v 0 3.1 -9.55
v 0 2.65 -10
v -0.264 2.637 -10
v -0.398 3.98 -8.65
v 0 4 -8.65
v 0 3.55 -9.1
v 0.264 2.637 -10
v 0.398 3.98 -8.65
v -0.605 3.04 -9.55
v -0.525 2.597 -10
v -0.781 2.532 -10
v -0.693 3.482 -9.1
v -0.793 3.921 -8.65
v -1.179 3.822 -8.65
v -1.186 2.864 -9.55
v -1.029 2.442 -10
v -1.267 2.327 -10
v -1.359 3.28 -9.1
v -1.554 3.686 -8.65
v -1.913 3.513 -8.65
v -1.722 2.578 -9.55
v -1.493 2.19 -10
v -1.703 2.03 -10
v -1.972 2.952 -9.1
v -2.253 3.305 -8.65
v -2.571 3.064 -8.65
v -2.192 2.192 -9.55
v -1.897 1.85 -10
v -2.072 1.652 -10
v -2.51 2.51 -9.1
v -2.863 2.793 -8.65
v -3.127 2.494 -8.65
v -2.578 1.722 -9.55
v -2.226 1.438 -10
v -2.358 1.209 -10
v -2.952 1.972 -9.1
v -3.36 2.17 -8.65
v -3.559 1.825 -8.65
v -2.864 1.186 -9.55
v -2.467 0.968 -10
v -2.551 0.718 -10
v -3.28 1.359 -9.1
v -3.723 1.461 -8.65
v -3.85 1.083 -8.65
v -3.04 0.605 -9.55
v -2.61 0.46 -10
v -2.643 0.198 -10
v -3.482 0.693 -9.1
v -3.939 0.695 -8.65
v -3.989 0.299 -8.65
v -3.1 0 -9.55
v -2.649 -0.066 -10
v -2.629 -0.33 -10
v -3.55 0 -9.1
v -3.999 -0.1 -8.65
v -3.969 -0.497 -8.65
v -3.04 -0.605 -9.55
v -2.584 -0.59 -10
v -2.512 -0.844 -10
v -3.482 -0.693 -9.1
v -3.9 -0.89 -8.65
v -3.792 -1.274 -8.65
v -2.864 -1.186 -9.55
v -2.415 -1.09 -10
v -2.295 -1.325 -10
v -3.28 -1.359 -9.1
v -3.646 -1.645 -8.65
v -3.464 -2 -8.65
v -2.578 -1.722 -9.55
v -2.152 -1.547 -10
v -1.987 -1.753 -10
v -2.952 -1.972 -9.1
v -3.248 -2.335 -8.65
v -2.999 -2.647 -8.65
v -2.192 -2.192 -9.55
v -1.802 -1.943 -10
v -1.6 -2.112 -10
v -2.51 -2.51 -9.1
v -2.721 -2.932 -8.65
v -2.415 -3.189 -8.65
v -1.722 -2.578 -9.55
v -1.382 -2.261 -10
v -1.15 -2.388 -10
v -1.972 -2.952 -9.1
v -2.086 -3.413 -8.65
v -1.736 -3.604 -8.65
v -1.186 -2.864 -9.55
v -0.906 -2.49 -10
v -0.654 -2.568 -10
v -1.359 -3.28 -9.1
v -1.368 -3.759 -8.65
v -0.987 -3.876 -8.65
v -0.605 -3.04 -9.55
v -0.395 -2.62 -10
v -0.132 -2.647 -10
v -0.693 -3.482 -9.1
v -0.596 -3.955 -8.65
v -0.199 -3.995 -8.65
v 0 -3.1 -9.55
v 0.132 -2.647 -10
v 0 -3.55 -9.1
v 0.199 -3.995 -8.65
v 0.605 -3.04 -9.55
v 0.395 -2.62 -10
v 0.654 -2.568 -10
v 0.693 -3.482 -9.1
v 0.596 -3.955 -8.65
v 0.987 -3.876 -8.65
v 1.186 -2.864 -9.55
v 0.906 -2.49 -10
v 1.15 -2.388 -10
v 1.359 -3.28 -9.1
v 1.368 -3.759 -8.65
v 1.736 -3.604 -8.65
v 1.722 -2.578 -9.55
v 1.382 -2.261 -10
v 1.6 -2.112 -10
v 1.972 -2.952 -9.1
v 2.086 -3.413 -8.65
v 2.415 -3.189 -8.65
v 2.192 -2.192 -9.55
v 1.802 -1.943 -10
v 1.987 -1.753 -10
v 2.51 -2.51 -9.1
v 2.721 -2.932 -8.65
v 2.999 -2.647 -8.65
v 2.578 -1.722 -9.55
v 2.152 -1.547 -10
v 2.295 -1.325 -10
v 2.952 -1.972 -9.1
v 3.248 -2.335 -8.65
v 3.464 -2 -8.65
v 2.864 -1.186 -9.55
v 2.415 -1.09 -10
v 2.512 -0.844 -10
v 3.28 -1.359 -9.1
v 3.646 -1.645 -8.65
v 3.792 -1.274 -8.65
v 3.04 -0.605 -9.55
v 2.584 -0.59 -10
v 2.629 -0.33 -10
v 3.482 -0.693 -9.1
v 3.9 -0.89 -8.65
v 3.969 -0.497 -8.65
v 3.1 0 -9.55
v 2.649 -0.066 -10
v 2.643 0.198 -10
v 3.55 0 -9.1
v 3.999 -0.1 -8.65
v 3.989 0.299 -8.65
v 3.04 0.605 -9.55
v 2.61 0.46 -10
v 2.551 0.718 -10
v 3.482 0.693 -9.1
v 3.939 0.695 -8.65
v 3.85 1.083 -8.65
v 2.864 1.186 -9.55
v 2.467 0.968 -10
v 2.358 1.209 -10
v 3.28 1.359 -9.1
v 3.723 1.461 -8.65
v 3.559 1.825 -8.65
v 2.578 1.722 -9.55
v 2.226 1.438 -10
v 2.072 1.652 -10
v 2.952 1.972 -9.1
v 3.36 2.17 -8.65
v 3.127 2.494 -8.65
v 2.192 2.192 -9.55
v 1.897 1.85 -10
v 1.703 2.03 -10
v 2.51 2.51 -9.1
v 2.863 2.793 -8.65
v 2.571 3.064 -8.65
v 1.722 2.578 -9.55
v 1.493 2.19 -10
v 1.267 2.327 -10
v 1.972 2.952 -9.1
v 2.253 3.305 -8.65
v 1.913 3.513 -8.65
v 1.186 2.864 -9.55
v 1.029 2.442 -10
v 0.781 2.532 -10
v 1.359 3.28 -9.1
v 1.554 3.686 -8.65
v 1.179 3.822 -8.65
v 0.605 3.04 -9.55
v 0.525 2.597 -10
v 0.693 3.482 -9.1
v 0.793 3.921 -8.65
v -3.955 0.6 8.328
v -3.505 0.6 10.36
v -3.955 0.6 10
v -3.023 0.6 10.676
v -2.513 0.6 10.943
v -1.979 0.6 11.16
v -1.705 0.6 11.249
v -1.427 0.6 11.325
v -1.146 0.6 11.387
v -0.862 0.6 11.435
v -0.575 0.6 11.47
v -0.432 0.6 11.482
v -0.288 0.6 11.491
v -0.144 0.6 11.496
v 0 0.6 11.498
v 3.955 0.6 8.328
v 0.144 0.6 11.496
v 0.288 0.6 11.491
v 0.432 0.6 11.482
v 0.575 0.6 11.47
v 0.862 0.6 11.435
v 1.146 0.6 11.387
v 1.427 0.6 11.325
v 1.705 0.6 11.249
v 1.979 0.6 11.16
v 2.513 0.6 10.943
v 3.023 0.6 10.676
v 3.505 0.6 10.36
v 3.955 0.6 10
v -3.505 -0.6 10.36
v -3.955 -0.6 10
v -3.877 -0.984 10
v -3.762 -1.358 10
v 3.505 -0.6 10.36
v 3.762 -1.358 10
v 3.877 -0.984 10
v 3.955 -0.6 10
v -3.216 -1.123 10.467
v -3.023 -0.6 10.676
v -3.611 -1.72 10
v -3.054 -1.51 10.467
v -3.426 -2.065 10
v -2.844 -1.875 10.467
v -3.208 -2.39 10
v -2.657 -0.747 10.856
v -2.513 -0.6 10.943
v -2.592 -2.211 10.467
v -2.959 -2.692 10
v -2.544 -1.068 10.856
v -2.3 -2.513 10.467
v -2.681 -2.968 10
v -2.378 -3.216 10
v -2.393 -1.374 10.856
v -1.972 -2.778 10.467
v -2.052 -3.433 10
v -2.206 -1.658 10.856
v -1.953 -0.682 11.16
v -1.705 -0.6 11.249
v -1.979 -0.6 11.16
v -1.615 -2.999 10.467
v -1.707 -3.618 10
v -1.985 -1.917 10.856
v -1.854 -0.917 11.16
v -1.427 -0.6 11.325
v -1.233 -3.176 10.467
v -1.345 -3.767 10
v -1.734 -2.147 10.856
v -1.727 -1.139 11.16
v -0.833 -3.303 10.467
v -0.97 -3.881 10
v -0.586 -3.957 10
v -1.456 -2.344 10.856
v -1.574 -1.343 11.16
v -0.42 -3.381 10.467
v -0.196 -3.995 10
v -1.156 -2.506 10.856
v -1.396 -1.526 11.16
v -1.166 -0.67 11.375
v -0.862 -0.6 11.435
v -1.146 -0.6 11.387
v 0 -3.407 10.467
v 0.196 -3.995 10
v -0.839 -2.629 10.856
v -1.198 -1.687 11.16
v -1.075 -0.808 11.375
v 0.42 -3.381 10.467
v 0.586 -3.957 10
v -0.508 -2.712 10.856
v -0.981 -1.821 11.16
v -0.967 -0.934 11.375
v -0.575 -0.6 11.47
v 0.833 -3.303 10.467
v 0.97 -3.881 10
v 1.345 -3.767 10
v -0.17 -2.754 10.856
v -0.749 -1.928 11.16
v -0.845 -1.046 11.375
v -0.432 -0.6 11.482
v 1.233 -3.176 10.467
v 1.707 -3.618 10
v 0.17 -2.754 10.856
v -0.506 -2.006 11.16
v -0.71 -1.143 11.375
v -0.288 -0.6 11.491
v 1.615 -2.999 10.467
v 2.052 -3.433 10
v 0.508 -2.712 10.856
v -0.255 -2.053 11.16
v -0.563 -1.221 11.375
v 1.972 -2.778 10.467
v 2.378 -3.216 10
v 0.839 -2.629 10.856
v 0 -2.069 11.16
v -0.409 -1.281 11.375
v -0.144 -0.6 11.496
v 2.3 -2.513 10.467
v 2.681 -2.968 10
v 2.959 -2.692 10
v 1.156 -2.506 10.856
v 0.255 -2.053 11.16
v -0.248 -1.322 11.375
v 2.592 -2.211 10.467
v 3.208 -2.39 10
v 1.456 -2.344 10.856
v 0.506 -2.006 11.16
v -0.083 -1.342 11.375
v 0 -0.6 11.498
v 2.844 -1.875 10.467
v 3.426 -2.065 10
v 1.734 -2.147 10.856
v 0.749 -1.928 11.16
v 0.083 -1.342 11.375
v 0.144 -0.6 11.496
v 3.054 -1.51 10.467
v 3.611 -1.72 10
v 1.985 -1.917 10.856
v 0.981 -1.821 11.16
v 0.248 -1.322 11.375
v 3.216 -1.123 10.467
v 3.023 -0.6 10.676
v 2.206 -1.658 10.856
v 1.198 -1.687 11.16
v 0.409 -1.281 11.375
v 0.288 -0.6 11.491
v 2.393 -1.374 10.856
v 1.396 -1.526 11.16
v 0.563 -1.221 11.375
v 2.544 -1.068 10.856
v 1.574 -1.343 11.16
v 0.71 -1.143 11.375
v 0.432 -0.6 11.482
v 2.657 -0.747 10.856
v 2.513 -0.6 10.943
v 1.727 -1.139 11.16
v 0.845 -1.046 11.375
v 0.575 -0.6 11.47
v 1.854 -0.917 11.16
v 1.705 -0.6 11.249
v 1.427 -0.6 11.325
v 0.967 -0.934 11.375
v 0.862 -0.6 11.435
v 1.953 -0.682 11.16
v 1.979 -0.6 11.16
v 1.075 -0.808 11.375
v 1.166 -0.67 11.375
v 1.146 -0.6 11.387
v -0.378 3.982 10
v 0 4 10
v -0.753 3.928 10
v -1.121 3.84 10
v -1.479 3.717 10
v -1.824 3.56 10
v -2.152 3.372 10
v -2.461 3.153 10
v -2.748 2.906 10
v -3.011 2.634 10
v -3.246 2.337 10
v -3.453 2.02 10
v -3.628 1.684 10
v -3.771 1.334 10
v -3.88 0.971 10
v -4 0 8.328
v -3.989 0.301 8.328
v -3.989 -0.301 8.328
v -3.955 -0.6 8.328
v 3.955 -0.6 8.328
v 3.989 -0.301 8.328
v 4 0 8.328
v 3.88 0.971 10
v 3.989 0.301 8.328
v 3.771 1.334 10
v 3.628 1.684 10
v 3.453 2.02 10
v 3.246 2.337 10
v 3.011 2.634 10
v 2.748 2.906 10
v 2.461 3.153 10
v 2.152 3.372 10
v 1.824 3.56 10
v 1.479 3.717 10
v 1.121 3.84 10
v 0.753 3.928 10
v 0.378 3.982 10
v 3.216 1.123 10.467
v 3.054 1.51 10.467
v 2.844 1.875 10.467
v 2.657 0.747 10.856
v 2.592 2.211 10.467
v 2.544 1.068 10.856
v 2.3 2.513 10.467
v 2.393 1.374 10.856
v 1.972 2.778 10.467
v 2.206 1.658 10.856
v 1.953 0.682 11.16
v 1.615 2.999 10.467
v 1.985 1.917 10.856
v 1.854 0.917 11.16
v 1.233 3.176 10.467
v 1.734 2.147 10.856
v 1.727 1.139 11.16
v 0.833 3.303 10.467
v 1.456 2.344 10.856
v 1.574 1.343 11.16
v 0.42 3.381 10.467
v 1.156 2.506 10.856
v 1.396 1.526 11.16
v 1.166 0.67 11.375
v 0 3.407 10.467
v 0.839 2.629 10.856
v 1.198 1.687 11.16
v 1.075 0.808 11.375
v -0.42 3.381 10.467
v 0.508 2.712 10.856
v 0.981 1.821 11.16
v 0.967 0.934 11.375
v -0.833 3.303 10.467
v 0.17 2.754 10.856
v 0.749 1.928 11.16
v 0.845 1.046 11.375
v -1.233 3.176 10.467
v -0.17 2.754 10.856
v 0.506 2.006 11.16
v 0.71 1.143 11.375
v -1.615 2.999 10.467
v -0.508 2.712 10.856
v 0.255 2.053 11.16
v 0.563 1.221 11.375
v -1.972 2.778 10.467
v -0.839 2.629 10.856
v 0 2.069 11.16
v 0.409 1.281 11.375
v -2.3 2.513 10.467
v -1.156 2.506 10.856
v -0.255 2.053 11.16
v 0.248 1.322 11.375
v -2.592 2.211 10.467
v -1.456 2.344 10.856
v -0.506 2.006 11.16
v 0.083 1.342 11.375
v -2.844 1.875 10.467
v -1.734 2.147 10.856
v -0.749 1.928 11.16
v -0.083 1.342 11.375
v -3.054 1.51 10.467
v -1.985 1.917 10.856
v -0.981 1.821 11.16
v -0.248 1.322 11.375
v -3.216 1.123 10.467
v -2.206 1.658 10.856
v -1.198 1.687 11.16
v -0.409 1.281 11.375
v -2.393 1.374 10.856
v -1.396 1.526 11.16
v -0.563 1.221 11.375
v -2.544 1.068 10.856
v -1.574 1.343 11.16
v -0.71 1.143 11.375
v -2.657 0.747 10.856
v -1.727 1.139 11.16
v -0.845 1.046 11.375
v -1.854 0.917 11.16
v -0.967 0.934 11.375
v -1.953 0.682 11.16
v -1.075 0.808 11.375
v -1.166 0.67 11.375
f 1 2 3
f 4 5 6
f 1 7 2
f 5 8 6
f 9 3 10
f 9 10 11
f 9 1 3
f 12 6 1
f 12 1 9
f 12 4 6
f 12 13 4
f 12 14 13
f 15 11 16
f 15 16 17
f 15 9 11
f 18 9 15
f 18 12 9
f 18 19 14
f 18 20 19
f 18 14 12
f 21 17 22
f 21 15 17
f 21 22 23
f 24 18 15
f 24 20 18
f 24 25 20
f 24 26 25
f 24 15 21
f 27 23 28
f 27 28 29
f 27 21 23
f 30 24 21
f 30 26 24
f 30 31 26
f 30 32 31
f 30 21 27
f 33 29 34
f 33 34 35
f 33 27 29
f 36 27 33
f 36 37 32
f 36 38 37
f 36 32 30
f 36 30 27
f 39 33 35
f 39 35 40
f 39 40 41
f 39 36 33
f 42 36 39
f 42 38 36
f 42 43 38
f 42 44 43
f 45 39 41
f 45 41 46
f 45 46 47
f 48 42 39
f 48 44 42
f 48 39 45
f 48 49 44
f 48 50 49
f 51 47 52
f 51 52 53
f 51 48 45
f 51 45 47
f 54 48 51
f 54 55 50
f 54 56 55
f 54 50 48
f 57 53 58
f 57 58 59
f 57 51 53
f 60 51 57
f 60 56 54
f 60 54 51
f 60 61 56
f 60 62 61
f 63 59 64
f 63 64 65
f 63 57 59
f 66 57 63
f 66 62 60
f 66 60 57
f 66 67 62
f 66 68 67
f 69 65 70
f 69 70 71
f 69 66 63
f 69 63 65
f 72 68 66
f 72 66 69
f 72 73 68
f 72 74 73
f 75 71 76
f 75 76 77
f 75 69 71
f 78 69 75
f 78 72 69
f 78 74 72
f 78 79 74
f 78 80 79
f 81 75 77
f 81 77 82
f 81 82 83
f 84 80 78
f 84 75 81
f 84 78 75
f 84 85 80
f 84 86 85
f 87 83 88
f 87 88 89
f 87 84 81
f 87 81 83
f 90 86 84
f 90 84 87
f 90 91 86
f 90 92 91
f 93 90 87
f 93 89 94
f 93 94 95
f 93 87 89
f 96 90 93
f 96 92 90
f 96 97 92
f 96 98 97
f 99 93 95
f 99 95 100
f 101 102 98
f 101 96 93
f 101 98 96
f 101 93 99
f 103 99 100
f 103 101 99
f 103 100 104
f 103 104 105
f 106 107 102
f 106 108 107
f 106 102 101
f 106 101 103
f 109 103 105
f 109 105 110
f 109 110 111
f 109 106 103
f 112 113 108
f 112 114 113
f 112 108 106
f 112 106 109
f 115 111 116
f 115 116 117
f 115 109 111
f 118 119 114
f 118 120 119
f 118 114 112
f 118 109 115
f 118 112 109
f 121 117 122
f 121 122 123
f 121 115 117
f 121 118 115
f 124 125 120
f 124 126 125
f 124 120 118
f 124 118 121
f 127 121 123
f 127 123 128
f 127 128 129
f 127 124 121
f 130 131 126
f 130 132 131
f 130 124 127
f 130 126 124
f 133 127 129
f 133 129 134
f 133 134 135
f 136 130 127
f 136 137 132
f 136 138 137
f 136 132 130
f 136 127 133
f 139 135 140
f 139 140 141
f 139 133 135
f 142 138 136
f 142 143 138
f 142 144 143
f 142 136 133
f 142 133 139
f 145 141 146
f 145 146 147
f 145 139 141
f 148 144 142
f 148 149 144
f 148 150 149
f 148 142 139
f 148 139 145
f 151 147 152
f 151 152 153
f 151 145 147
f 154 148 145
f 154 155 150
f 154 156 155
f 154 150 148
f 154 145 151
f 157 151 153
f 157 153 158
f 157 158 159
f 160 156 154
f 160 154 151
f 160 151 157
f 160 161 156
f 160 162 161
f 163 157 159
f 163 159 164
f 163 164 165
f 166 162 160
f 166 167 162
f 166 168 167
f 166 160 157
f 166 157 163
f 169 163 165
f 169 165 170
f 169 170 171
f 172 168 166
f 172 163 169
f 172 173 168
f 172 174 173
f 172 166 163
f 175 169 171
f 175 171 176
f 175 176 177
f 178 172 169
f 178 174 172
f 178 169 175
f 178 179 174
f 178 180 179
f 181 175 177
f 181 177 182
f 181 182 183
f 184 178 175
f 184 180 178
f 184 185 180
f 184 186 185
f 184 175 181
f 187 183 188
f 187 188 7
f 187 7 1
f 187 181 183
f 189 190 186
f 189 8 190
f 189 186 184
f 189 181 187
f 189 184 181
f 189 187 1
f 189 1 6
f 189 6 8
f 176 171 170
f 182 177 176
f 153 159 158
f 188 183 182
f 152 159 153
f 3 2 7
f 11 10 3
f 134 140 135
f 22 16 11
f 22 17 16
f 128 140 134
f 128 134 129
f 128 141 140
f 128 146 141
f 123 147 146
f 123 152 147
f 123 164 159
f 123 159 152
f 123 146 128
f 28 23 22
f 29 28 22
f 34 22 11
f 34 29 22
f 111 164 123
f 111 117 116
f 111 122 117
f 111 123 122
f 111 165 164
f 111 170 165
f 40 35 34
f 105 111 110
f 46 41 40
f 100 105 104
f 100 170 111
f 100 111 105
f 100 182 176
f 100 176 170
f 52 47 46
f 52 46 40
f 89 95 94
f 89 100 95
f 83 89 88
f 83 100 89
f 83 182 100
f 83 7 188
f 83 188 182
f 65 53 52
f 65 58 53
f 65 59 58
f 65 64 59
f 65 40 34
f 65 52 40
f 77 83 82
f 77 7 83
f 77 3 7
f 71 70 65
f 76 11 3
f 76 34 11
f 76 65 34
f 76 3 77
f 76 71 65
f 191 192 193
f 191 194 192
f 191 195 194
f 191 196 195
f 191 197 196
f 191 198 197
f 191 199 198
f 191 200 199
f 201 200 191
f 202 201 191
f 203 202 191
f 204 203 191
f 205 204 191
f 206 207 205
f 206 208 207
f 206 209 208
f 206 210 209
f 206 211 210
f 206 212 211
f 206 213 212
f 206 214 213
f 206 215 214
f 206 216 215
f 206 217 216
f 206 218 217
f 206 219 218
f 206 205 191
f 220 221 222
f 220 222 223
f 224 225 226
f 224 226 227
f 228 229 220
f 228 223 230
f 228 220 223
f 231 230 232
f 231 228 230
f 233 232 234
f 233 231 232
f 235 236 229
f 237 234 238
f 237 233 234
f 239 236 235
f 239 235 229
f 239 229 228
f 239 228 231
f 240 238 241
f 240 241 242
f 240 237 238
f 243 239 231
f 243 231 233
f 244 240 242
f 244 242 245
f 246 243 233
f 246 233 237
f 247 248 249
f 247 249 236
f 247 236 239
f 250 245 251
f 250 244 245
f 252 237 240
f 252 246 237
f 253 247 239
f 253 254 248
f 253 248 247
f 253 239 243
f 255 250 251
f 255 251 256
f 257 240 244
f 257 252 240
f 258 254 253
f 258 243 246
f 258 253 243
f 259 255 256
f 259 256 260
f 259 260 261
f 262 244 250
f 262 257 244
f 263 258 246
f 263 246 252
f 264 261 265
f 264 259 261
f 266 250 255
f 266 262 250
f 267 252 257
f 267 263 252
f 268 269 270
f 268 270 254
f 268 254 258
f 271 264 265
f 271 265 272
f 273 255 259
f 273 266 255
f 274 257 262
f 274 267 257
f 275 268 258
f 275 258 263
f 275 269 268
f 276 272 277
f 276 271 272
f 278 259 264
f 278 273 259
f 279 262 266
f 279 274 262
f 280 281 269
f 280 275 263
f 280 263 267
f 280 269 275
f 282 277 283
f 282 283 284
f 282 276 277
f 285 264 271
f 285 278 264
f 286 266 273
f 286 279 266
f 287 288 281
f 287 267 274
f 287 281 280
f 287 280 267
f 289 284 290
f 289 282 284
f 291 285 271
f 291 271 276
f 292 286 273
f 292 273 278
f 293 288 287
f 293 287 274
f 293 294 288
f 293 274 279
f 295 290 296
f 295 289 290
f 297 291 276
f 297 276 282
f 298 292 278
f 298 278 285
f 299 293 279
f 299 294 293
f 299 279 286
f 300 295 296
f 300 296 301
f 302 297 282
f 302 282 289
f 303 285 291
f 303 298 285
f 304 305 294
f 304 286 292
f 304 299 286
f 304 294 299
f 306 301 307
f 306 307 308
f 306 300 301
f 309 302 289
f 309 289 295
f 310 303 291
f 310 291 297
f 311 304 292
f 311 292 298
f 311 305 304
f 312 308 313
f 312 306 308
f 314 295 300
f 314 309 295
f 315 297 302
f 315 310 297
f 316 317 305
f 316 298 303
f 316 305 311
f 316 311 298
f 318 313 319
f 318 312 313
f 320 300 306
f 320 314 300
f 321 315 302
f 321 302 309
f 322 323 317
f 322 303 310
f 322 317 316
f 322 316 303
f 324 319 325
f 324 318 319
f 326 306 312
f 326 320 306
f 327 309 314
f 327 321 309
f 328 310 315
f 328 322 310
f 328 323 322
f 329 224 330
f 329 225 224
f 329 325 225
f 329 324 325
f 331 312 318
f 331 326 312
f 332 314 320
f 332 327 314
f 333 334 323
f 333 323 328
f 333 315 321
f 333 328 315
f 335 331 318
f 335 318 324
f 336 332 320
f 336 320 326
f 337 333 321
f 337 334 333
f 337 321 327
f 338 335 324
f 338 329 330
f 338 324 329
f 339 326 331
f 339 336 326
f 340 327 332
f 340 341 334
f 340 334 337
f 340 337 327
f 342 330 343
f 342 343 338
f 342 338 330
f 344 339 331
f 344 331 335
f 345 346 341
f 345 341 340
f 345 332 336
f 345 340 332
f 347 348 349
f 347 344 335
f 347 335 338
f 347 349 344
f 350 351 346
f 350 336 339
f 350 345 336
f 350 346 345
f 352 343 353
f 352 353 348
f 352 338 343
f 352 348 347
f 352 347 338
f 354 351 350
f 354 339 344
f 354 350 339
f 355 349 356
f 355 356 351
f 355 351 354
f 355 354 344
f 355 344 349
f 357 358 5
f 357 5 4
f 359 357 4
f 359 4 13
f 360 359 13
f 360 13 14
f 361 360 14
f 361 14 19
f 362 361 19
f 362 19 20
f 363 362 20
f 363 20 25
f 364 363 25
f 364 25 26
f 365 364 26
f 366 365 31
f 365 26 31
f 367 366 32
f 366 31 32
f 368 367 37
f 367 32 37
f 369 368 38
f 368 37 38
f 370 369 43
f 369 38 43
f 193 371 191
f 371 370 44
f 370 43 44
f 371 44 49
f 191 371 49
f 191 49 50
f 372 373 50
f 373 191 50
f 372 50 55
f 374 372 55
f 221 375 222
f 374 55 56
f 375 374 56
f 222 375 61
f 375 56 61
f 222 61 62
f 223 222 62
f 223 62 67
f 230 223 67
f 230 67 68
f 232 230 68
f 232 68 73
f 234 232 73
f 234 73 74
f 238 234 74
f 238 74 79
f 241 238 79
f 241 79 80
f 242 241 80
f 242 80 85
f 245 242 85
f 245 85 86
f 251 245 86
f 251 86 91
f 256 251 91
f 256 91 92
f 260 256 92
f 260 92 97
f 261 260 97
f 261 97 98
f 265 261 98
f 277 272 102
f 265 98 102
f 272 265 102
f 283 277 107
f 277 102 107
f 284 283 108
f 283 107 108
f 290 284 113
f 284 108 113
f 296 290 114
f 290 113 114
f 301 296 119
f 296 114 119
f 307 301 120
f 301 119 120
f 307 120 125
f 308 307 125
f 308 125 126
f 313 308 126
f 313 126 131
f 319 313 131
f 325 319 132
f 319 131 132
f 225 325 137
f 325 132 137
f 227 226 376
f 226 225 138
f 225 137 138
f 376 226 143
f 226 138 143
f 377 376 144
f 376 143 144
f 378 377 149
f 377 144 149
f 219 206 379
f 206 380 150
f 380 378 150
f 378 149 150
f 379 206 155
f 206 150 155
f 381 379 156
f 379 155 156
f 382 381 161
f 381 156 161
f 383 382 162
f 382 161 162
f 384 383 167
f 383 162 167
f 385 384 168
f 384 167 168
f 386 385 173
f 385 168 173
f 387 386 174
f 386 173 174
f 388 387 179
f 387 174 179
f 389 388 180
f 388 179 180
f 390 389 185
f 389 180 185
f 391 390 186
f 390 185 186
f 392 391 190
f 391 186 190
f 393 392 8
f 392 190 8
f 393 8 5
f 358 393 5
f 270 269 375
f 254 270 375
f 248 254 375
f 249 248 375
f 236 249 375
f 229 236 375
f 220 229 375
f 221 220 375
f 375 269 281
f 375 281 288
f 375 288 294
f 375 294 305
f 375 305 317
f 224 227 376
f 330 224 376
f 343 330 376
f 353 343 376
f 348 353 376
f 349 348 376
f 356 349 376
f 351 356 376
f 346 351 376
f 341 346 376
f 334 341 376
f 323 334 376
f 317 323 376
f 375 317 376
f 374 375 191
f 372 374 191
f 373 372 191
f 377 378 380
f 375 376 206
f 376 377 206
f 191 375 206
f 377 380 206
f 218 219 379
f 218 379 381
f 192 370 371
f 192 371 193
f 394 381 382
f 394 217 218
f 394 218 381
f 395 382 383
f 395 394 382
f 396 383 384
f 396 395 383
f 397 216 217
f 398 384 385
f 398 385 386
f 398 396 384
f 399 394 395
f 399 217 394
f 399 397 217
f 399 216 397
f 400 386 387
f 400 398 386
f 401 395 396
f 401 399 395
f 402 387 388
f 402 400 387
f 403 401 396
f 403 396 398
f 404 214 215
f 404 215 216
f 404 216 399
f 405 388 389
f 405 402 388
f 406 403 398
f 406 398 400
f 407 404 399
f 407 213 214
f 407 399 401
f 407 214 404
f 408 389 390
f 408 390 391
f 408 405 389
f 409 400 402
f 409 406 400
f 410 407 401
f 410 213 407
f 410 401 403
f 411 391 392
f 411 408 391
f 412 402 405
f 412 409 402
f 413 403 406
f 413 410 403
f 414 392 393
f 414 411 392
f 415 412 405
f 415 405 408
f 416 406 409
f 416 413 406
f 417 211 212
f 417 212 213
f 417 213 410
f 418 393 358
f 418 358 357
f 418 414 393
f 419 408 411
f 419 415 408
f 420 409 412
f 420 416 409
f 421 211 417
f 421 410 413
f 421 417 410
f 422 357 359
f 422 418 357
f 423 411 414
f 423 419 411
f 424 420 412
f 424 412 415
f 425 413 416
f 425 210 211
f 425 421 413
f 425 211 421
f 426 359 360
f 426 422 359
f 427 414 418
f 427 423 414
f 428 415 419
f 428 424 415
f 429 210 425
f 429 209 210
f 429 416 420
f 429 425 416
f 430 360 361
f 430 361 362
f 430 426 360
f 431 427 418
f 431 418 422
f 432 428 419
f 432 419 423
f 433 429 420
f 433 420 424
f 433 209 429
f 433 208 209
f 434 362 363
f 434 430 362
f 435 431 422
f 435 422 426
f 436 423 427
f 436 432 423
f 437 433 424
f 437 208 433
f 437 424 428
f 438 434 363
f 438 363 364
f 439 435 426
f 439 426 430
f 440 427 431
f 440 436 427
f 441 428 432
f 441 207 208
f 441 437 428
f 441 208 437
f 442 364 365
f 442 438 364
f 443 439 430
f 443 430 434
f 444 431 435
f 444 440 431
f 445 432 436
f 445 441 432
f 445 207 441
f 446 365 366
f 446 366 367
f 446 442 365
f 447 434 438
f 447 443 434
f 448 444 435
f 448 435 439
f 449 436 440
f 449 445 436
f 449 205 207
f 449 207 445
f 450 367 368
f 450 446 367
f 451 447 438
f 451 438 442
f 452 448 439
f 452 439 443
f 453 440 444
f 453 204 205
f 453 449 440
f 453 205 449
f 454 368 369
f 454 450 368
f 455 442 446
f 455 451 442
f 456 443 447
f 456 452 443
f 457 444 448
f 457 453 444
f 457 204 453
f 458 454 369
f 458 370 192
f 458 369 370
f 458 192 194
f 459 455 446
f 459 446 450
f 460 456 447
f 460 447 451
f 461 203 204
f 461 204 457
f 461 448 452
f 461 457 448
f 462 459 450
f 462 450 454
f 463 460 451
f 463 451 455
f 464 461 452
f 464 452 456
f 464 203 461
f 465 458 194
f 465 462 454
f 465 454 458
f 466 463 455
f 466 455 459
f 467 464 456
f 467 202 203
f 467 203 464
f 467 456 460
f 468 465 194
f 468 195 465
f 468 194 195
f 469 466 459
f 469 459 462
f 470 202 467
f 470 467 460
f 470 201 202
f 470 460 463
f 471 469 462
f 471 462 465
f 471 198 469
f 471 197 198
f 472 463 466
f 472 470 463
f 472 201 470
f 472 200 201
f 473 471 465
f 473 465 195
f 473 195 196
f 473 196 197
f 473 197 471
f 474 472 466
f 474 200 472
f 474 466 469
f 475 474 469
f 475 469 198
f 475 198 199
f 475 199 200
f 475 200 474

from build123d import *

# Parameters (mm, degrees)
SKETCH_1_W          = 20
SKETCH_1_H          = 4
CHAMFER_1_SIZE      = 1.35
SKETCH_2_W          = 3.34427191
SKETCH_2_H          = 1.2
CUT_EXTRUDE_1_DEPTH = 5


with BuildPart() as part:
    # Эскиз1 → Повернуть1 (revolve)
    with BuildSketch(Plane(origin=(0, 0, 0), x_dir=(0, 0, -1), z_dir=(1, 0, 0))):
        with BuildLine():
            Line((-10, 0), (-10, 4))
            ThreePointArc((-10, 4), (-11.132898199, 2.140932539), (-11.527864045, 0))
            Line((-11.527864045, 0), (-10, 0))
        make_face()
        with Locations((0, 2)):
            Rectangle(SKETCH_1_W, SKETCH_1_H)
    revolve(axis=Axis((0, 0, -10), (0, 0, 1)))

    # Фаска1
    chamfer_1_edges = [part.edges().sort_by_distance(p)[0] for p in [
        (0, -4, -10),
    ]]
    chamfer(chamfer_1_edges, length=CHAMFER_1_SIZE)

    # Эскиз2 → Вырез-Вытянуть1 (cut, symmetric)
    with BuildSketch(Plane(origin=(0, 0, 0), x_dir=(0, 0, -1), z_dir=(1, 0, 0))):
        with Locations((-10, 0)):
            Rectangle(SKETCH_2_W, SKETCH_2_H)
    extrude(amount=CUT_EXTRUDE_1_DEPTH, both=True, mode=Mode.SUBTRACT)


solid = part.part
